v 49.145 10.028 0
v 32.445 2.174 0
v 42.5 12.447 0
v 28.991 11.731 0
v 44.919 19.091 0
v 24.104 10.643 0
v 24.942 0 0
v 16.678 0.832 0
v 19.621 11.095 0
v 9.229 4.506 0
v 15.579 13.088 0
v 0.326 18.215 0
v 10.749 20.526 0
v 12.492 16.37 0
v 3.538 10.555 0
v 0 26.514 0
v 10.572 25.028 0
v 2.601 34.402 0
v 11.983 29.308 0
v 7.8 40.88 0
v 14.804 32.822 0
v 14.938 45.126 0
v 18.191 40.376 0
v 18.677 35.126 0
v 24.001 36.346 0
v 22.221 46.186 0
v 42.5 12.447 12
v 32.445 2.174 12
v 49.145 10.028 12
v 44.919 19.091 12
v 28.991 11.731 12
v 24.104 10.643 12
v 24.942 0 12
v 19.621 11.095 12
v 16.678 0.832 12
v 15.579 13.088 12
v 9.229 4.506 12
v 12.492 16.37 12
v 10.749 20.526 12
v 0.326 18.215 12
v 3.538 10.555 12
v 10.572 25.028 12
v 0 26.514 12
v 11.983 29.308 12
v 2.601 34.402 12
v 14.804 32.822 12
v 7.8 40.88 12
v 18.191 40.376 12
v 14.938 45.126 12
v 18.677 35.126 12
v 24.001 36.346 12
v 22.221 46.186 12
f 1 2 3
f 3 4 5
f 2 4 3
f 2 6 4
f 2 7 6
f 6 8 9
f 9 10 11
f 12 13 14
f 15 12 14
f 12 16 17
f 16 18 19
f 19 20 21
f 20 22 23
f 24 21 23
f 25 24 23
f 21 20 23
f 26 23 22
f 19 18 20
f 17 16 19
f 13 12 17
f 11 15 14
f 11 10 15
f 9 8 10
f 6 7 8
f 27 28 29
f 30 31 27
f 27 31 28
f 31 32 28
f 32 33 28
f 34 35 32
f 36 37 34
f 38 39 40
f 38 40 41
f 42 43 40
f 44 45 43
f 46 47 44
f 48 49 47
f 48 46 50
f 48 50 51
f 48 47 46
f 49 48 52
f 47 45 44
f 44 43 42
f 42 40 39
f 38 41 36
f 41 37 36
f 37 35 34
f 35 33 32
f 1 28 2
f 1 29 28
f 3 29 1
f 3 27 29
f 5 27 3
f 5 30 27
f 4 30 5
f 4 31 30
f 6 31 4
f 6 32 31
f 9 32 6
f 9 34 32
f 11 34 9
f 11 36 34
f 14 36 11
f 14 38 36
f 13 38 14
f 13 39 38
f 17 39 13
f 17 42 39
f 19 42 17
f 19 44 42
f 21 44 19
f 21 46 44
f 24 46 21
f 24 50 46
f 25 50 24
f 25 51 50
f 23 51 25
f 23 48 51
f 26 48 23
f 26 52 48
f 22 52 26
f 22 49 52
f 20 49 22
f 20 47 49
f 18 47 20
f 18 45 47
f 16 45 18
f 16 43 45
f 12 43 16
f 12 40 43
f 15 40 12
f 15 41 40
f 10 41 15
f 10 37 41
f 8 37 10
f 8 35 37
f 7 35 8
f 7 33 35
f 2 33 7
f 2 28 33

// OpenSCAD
$fn = 32;

// ----------------------------------------------------------------------
// Hook plate: curl radius 18 mm over 205 degrees, 10 mm thick band
// ----------------------------------------------------------------------

// --- parameters (mm) ---
profile_height = 12;      // extrusion height
profile_points = 26;      // points of the closed outline

profile = [[18.191, 40.376], [22.221, 46.186], [14.938, 45.126], [7.8, 40.88], [2.601, 34.402], [0, 26.514], [0.326, 18.215], [3.538, 10.555], [9.229, 4.506], [16.678, 0.832], [24.942, 0], [32.445, 2.174], [49.145, 10.028], [42.5, 12.447], [44.919, 19.091], [28.991, 11.731], [24.104, 10.643], [19.621, 11.095], [15.579, 13.088], [12.492, 16.37], [10.749, 20.526], [10.572, 25.028], [11.983, 29.308], [14.804, 32.822], [18.677, 35.126], [24.001, 36.346]];  // single closed polygon, 26 points, counter clockwise

// --- the one profile operation ---
linear_extrude(height = profile_height) polygon(points = profile);
